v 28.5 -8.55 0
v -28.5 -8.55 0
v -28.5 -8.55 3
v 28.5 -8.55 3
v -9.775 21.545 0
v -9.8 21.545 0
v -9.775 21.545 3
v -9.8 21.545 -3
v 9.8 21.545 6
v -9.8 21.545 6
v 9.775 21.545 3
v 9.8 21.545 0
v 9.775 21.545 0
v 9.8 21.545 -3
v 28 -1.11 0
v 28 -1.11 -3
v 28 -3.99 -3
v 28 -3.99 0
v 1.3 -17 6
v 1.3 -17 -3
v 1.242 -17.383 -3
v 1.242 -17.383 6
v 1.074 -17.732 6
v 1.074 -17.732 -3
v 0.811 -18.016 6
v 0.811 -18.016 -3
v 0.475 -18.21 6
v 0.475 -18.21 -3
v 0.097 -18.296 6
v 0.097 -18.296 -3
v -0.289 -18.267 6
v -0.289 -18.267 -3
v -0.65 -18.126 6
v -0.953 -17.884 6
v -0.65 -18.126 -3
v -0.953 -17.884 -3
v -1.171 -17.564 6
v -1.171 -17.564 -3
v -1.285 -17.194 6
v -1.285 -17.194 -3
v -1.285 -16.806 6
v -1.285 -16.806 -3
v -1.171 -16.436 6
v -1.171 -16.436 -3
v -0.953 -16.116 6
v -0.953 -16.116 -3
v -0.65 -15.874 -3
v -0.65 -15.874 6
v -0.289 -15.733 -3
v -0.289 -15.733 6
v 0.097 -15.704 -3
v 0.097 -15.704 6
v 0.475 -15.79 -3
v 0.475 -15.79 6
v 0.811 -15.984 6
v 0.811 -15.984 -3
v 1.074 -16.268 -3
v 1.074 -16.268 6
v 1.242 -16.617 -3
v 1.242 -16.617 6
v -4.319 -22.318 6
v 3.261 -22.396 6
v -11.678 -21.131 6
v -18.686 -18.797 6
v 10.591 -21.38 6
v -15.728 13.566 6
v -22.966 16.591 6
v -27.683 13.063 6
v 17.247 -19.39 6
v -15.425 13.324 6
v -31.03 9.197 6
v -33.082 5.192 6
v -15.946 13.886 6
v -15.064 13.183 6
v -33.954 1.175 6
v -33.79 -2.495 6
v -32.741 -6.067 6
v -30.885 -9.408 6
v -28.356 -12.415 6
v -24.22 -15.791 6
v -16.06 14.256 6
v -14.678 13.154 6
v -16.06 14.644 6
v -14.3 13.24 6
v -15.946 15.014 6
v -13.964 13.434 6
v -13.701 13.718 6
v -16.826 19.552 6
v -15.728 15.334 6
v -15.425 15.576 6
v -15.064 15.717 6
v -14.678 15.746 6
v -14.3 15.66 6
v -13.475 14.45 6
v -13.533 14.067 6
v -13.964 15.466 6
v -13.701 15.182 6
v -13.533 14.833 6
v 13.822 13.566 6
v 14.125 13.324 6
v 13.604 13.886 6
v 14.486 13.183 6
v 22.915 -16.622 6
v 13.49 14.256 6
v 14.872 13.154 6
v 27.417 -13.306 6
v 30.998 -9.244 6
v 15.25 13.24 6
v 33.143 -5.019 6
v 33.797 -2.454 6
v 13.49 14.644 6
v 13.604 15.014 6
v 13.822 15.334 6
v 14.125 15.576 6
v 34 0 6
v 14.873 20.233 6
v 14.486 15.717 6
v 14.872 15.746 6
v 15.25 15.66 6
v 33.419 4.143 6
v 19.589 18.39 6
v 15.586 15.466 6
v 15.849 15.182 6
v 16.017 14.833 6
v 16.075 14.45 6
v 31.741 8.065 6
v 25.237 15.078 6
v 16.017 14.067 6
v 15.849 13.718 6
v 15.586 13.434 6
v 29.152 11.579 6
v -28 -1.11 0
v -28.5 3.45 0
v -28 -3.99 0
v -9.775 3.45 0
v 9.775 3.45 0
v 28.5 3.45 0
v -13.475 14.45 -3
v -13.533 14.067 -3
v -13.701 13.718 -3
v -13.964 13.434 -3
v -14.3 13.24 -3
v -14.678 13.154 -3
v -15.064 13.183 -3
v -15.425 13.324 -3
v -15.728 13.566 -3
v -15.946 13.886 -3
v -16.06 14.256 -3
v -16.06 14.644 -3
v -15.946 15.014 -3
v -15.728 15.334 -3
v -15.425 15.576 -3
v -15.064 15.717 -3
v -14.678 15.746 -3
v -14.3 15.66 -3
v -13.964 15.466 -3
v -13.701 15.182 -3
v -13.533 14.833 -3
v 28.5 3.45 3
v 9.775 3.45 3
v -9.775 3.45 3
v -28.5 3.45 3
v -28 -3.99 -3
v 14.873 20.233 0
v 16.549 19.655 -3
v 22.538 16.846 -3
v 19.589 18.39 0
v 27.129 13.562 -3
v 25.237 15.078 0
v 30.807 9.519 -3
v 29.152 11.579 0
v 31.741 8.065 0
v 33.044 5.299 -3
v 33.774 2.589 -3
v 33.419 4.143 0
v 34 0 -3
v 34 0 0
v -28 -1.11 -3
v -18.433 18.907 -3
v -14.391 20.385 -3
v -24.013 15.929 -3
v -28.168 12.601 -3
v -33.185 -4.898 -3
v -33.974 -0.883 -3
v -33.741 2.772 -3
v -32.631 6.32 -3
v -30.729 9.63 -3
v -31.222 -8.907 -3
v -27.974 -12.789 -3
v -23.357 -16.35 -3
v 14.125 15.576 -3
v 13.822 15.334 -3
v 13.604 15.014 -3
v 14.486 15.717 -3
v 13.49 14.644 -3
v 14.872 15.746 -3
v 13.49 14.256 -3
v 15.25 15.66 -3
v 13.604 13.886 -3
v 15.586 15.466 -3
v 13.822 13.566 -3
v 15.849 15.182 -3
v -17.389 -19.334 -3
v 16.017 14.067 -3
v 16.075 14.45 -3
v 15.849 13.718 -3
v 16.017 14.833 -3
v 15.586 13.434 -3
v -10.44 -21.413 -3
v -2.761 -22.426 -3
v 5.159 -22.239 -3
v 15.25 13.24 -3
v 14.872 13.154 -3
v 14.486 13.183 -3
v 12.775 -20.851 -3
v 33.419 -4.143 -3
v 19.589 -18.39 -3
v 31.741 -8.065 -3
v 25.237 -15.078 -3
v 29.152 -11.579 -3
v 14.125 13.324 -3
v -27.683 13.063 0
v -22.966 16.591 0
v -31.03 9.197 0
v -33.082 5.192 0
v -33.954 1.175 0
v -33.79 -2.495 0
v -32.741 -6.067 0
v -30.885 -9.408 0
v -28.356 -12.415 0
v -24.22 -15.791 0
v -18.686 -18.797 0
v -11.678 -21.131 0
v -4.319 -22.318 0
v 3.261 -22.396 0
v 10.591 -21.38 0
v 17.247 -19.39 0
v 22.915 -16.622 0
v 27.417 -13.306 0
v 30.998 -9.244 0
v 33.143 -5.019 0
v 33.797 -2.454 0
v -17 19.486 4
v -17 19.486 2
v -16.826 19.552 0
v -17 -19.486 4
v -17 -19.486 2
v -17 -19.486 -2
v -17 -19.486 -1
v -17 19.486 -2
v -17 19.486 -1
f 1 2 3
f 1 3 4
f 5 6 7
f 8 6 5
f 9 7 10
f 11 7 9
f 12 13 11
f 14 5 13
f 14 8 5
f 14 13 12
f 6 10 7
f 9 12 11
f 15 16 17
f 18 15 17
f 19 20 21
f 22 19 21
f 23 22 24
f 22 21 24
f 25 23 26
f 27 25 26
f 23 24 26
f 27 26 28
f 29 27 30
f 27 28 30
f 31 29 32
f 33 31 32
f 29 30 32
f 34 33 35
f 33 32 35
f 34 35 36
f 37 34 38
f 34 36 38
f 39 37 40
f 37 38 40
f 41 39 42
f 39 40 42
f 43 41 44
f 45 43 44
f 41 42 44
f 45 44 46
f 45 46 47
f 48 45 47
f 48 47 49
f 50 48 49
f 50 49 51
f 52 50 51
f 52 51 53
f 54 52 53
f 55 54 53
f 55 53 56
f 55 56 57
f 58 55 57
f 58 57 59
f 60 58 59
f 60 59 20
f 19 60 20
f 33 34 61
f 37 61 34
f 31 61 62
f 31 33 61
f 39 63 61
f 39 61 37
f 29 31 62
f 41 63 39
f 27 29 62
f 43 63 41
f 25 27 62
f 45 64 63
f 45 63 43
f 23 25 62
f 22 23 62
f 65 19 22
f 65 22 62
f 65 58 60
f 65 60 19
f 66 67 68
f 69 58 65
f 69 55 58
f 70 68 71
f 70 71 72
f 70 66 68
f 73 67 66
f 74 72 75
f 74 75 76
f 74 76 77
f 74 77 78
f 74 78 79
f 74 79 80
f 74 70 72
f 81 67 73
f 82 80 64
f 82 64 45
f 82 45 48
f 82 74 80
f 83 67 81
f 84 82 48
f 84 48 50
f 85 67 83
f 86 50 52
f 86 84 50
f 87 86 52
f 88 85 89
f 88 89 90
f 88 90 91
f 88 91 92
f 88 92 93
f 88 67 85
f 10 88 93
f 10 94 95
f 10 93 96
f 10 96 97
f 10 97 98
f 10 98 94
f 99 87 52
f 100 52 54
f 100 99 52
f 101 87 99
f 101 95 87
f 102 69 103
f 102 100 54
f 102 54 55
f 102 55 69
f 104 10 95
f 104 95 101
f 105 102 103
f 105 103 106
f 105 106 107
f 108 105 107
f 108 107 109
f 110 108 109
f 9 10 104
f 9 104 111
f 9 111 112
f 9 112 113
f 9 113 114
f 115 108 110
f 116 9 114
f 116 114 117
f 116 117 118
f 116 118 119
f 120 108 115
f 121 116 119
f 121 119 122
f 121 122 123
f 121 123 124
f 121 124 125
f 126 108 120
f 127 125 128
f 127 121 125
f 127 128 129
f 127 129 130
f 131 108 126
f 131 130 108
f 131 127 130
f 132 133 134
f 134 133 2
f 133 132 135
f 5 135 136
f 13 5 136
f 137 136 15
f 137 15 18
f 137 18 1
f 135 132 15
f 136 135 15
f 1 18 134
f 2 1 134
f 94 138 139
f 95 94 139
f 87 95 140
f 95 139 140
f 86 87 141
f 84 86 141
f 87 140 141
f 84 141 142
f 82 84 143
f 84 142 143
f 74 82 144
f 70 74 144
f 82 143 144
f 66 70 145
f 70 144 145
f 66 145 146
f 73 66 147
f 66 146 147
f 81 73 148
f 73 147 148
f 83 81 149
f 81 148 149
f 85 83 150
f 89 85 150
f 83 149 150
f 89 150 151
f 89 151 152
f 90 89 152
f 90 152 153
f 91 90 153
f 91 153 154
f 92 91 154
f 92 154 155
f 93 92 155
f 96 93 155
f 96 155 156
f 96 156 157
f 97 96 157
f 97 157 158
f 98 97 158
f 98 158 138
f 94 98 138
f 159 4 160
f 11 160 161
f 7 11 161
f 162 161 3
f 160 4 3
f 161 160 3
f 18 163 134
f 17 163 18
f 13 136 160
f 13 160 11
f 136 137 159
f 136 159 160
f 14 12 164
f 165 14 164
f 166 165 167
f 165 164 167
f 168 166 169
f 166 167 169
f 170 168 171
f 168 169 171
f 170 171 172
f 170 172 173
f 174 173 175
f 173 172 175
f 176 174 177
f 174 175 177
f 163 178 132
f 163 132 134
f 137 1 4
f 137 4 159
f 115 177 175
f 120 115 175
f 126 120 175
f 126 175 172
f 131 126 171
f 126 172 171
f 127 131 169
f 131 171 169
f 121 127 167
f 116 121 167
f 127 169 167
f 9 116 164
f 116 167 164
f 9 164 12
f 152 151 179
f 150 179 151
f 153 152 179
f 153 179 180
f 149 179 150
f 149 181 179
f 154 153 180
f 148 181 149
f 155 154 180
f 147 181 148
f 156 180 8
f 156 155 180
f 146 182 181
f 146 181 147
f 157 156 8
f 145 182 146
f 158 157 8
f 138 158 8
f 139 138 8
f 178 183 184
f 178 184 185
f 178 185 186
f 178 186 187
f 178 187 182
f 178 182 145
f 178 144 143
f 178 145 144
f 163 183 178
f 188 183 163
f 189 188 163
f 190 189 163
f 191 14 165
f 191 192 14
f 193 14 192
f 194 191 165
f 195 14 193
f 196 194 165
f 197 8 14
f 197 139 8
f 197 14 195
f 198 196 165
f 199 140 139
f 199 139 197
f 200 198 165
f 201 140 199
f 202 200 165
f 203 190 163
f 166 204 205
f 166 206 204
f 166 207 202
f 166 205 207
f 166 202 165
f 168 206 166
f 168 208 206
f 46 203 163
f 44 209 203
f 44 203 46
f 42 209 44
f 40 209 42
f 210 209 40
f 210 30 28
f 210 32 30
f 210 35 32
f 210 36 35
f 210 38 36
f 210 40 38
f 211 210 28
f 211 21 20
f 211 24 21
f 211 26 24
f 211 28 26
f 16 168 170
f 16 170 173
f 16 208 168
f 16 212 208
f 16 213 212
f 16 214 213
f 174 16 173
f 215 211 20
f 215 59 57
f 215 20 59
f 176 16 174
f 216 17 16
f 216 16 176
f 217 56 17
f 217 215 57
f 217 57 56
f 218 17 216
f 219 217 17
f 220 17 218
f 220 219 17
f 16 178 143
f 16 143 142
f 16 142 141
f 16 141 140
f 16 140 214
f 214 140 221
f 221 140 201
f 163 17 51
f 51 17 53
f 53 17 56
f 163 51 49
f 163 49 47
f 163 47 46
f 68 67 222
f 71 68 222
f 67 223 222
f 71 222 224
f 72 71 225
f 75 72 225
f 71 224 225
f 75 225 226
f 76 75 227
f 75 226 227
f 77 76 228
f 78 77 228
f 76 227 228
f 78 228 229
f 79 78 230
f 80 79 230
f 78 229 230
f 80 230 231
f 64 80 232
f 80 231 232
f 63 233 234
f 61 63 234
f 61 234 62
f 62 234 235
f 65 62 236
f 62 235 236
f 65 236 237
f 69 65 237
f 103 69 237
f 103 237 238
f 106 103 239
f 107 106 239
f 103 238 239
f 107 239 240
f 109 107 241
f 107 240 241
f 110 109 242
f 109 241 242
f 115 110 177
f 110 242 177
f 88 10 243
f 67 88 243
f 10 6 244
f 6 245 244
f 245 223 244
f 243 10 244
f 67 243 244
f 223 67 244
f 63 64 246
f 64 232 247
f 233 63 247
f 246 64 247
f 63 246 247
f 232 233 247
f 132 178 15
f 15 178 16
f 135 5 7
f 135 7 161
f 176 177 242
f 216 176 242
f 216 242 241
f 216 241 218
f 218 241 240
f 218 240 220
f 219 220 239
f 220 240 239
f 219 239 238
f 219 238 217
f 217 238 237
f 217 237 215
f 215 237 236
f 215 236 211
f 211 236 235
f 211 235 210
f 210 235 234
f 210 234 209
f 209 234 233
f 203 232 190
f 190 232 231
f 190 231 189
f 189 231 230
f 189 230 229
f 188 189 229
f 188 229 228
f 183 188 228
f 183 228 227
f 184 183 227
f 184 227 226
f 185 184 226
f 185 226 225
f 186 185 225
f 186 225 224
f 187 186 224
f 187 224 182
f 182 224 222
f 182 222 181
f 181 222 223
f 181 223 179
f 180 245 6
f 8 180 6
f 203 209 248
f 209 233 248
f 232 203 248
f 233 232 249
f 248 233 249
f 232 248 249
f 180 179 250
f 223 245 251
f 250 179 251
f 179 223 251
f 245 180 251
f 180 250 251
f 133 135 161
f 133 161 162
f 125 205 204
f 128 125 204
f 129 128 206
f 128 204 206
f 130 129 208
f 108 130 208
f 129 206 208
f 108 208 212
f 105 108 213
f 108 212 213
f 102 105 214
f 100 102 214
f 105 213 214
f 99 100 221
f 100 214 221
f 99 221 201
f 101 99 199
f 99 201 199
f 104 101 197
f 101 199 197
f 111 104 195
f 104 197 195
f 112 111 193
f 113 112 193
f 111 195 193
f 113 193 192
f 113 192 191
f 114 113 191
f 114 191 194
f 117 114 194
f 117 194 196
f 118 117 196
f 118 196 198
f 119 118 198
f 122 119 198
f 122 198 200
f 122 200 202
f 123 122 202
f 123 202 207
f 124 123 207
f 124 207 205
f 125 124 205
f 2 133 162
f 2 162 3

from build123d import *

# Parameters (mm, degrees)
PAD_DEPTH       = 6
POCKET_DEPTH    = 3
PAD001_DEPTH    = 3
SKETCH003_W     = 56
SKETCH003_H     = 2.88
POCKET001_DEPTH = 3
SKETCH004_W     = 19.6
SKETCH004_H     = 1
POCKET002_DEPTH = 9.001
SKETCH005_R     = 1.3
POCKET003_DEPTH = 9.001


with BuildPart() as part:
    # Sketch → Pad (new body)
    with BuildSketch(Plane.XY):
        with BuildLine():
            add(Edge.make_bspline(
                [(34, 0), (34, 38.971143), (-17, 19.485572), (-68, 0), (-17, -19.485572), (34, -38.971143), (34, 0)],
                knots=[0, 0, 0, 2.094395, 2.094395, 4.18879, 4.18879, 6.283185, 6.283185, 6.283185], degree=2, weights=[1, 0.5, 1, 0.5, 1, 0.5, 1]))
        make_face()
    extrude(amount=PAD_DEPTH)

    # Sketch001 (on Face2 of Pad) → Pocket (cut)
    with BuildSketch(Plane(origin=(0, 0, 0), x_dir=(1, 0, 0), z_dir=(0, 0, -1))):
        Polygon((9.775, -3.450064), (9.775, -21.550064), (-9.775, -21.550064), (-9.775, -3.450064), (-28.5, -3.450064), (-28.5, 8.549936), (28.5, 8.549936), (28.5, -3.450064), align=None)
    extrude(amount=-POCKET_DEPTH, mode=Mode.SUBTRACT)

    # Sketch002 (on Face2 of Pocket) → Pad001 (join)
    with BuildSketch(Plane(origin=(0, 0, 0), x_dir=(1, 0, 0), z_dir=(0, 0, -1))):
        with BuildLine():
            add(Edge.make_bspline(
                [(34, 0), (34, 38.971143), (-17, 19.485572), (-68, 0), (-17, -19.485572), (34, -38.971143), (34, 0)],
                knots=[0, 0, 0, 2.094395, 2.094395, 4.18879, 4.18879, 6.283185, 6.283185, 6.283185], degree=2, weights=[1, 0.5, 1, 0.5, 1, 0.5, 1]))
        make_face()
    extrude(amount=PAD001_DEPTH)

    # Sketch003 (on Face4 of Pad001) → Pocket001 (cut)
    with BuildSketch(Plane(origin=(0, 0, -3), x_dir=(1, 0, 0), z_dir=(0, 0, -1))):
        with Locations((0, 2.549936)):
            Rectangle(SKETCH003_W, SKETCH003_H)
    extrude(amount=-POCKET001_DEPTH, mode=Mode.SUBTRACT)

    # Sketch004 (on Face4 of Pocket001) → Pocket002 (cut, through all)
    with BuildSketch(Plane(origin=(0, 0, -3), x_dir=(1, 0, 0), z_dir=(0, 0, -1))):
        with Locations((0, -22.045091)):
            Rectangle(SKETCH004_W, SKETCH004_H)
    extrude(amount=-POCKET002_DEPTH, mode=Mode.SUBTRACT)

    # Sketch005 (on Face7 of Pocket002) → Pocket003 (cut, through all)
    with BuildSketch(Plane(origin=(0, 0, -3), x_dir=(1, 0, 0), z_dir=(0, 0, -1))):
        with Locations((-14.775, -14.450064)):
            Circle(SKETCH005_R)
        with Locations((0, 17)):
            Circle(SKETCH005_R)
        with Locations((14.775, -14.450064)):
            Circle(SKETCH005_R)
    extrude(amount=-POCKET003_DEPTH, mode=Mode.SUBTRACT)


solid = part.part
